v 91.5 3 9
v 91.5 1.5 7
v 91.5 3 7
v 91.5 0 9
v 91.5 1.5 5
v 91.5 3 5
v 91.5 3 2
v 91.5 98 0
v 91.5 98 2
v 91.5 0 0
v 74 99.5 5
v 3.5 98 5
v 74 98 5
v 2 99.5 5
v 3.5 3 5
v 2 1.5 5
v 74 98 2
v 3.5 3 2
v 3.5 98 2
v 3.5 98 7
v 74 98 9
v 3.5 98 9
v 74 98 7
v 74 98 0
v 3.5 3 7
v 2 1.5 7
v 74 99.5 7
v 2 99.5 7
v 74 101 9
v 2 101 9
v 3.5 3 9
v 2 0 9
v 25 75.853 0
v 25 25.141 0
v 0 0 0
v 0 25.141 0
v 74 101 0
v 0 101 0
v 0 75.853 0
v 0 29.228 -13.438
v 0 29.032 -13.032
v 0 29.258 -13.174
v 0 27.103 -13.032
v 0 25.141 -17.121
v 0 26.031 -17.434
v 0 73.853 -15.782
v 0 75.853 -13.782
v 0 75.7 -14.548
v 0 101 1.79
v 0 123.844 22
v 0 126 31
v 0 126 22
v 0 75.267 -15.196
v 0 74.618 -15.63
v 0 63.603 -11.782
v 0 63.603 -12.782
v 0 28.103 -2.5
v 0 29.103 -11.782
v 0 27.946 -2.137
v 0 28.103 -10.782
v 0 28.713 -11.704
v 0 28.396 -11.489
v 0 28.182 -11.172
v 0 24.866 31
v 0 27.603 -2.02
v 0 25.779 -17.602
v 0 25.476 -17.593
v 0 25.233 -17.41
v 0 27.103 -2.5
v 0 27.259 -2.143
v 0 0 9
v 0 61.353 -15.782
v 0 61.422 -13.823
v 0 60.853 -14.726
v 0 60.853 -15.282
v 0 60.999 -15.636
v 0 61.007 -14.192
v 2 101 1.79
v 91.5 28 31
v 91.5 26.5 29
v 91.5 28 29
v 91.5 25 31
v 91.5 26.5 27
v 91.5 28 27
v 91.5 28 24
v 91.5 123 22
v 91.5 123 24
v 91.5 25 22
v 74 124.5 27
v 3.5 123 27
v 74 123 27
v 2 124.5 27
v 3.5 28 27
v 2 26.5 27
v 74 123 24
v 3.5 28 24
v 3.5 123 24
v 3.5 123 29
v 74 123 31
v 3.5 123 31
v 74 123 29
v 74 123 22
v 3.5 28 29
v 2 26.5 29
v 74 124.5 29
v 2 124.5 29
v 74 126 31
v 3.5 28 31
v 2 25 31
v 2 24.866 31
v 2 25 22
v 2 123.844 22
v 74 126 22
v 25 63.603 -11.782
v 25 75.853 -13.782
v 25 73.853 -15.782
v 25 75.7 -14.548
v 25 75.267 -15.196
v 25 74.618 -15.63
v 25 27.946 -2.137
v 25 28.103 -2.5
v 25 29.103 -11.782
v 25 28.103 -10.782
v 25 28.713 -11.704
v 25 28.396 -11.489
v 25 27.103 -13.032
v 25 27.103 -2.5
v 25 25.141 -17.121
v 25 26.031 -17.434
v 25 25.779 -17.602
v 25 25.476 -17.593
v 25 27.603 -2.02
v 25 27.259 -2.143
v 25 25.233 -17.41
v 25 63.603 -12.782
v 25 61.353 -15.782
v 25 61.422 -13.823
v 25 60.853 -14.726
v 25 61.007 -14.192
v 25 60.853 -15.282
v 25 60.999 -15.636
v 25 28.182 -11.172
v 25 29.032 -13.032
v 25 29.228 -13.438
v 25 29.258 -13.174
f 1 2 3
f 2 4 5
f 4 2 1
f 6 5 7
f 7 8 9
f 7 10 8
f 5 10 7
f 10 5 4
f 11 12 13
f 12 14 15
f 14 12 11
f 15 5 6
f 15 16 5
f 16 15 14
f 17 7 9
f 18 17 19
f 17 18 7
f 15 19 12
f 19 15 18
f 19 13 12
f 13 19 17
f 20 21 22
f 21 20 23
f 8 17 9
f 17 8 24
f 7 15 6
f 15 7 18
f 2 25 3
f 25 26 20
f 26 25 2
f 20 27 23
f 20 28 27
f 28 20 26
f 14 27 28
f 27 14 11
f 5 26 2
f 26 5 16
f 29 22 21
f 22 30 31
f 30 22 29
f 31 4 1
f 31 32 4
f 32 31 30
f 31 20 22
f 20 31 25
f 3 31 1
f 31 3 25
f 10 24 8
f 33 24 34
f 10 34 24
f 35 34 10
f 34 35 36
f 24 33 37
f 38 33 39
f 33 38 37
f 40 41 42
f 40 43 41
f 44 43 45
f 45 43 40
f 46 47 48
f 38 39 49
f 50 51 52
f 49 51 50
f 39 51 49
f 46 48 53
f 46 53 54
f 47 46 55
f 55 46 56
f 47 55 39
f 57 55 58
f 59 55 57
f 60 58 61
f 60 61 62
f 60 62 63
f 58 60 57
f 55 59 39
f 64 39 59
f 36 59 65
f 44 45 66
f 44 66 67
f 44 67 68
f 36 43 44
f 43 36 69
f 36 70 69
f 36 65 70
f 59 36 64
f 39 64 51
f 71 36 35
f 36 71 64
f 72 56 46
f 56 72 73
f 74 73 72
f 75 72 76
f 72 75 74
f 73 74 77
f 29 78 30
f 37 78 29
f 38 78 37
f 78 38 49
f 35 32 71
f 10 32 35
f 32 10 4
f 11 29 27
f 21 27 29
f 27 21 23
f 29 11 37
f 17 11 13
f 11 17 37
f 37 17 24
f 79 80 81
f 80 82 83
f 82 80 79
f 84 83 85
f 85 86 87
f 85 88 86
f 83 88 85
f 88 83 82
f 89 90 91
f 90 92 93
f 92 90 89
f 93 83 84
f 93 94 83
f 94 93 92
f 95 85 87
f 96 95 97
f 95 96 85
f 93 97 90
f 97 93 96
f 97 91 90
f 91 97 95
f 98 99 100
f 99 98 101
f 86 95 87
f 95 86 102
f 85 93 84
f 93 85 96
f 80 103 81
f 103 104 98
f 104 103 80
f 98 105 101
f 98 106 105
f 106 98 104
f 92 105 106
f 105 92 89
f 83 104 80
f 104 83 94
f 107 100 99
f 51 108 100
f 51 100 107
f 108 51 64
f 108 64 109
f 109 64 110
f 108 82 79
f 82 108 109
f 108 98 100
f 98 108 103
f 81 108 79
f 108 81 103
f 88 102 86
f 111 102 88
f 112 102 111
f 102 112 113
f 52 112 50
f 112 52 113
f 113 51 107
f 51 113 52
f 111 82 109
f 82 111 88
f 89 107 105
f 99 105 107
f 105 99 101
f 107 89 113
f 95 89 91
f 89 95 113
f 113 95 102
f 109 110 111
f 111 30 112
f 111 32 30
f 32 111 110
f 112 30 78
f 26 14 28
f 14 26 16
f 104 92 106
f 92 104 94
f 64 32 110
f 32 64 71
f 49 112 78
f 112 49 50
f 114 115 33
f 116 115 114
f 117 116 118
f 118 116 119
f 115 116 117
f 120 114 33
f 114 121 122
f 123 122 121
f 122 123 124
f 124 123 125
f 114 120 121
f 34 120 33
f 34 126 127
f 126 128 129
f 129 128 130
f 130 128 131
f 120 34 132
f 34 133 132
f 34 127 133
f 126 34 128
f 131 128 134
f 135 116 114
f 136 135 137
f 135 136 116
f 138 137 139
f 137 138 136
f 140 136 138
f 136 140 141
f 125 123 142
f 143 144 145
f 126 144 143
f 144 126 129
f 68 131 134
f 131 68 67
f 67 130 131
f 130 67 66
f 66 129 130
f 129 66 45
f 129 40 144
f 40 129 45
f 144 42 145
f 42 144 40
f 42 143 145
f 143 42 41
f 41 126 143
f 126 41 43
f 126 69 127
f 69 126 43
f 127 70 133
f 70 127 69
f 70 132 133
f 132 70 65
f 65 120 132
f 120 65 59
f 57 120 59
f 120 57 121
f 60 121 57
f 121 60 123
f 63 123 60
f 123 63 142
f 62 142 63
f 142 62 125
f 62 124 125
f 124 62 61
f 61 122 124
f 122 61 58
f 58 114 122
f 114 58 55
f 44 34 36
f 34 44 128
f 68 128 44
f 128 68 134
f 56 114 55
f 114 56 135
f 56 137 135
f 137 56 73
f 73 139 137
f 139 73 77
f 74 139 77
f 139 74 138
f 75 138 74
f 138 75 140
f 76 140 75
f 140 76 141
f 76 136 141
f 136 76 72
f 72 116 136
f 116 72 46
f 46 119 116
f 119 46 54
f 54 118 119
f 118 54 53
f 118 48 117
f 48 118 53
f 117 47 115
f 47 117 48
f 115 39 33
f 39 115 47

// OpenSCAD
// file: ../library/din_clip_01.scad
CLIP_H = 10;
HOLE_DEPTH = 9;
HOLE_DIAMETER = 2.9;

module din_clip(h=CLIP_H, grow=1) {
        intersection() {
        translate([0,0,-h/2]) cube([20,20,h]);
		linear_extrude(height=h, center=true, convexity=5) {
			import(file="din_clip_01.dxf", layer="0", $fn=64);
		}
    }
        translate([0,grow,0]) intersection() {
        translate([0,20-grow,-h/2]) cube([20,40,h]);
		linear_extrude(height=h, center=true, convexity=5) {
			import(file="din_clip_01.dxf", layer="0", $fn=64);
		}
    }
}

din_clip();
// main file
use <../library/din_clip_01.scad>

PCB_HEIGHT=98;
PCB_WIDTH1=90;
PCB_WIDTH2=96;
PCB_T =2;
PCB_FREE_SPACE=74;
T=2;

module half(width) {
difference() {
    cube([width+1.5,PCB_HEIGHT+3,3+3*T]);
    translate([1.5,1.5,T]) union() { 
        translate([2,1.5,0]) cube([width-2, PCB_HEIGHT-3, 3]);
        translate([0,0,3])cube([width, PCB_HEIGHT, T]);
        translate([2,1.5,3+T]) cube([width-2, PCB_HEIGHT-3, T]);
    }
    translate([PCB_FREE_SPACE,PCB_HEIGHT,0]) cube([width-PCB_FREE_SPACE+1.5,3,3+3*T]);
}
}

half(PCB_WIDTH1);
translate([0,25,22]) half(PCB_WIDTH1);
//translate([PCB_WIDTH1+PCB_WIDTH2+20,0,0]) mirror([1,0,0]) half(PCB_WIDTH2);

difference() {
cube([T,PCB_HEIGHT+25+3,22+3+3*T]);
color("red") translate([0,0,3+3*T]) rotate([-48.5,0,0]) translate([0,-20,0]) cube([2,20,50]);
color("red") translate([0,PCB_WIDTH2+16.24,-14.97]) rotate([-48.5,0,0]) translate([0,-20,0]) cube([2,20,50]);
}

translate([25/2,25,T]) rotate([0,90,0]) din_clip(h=25);
